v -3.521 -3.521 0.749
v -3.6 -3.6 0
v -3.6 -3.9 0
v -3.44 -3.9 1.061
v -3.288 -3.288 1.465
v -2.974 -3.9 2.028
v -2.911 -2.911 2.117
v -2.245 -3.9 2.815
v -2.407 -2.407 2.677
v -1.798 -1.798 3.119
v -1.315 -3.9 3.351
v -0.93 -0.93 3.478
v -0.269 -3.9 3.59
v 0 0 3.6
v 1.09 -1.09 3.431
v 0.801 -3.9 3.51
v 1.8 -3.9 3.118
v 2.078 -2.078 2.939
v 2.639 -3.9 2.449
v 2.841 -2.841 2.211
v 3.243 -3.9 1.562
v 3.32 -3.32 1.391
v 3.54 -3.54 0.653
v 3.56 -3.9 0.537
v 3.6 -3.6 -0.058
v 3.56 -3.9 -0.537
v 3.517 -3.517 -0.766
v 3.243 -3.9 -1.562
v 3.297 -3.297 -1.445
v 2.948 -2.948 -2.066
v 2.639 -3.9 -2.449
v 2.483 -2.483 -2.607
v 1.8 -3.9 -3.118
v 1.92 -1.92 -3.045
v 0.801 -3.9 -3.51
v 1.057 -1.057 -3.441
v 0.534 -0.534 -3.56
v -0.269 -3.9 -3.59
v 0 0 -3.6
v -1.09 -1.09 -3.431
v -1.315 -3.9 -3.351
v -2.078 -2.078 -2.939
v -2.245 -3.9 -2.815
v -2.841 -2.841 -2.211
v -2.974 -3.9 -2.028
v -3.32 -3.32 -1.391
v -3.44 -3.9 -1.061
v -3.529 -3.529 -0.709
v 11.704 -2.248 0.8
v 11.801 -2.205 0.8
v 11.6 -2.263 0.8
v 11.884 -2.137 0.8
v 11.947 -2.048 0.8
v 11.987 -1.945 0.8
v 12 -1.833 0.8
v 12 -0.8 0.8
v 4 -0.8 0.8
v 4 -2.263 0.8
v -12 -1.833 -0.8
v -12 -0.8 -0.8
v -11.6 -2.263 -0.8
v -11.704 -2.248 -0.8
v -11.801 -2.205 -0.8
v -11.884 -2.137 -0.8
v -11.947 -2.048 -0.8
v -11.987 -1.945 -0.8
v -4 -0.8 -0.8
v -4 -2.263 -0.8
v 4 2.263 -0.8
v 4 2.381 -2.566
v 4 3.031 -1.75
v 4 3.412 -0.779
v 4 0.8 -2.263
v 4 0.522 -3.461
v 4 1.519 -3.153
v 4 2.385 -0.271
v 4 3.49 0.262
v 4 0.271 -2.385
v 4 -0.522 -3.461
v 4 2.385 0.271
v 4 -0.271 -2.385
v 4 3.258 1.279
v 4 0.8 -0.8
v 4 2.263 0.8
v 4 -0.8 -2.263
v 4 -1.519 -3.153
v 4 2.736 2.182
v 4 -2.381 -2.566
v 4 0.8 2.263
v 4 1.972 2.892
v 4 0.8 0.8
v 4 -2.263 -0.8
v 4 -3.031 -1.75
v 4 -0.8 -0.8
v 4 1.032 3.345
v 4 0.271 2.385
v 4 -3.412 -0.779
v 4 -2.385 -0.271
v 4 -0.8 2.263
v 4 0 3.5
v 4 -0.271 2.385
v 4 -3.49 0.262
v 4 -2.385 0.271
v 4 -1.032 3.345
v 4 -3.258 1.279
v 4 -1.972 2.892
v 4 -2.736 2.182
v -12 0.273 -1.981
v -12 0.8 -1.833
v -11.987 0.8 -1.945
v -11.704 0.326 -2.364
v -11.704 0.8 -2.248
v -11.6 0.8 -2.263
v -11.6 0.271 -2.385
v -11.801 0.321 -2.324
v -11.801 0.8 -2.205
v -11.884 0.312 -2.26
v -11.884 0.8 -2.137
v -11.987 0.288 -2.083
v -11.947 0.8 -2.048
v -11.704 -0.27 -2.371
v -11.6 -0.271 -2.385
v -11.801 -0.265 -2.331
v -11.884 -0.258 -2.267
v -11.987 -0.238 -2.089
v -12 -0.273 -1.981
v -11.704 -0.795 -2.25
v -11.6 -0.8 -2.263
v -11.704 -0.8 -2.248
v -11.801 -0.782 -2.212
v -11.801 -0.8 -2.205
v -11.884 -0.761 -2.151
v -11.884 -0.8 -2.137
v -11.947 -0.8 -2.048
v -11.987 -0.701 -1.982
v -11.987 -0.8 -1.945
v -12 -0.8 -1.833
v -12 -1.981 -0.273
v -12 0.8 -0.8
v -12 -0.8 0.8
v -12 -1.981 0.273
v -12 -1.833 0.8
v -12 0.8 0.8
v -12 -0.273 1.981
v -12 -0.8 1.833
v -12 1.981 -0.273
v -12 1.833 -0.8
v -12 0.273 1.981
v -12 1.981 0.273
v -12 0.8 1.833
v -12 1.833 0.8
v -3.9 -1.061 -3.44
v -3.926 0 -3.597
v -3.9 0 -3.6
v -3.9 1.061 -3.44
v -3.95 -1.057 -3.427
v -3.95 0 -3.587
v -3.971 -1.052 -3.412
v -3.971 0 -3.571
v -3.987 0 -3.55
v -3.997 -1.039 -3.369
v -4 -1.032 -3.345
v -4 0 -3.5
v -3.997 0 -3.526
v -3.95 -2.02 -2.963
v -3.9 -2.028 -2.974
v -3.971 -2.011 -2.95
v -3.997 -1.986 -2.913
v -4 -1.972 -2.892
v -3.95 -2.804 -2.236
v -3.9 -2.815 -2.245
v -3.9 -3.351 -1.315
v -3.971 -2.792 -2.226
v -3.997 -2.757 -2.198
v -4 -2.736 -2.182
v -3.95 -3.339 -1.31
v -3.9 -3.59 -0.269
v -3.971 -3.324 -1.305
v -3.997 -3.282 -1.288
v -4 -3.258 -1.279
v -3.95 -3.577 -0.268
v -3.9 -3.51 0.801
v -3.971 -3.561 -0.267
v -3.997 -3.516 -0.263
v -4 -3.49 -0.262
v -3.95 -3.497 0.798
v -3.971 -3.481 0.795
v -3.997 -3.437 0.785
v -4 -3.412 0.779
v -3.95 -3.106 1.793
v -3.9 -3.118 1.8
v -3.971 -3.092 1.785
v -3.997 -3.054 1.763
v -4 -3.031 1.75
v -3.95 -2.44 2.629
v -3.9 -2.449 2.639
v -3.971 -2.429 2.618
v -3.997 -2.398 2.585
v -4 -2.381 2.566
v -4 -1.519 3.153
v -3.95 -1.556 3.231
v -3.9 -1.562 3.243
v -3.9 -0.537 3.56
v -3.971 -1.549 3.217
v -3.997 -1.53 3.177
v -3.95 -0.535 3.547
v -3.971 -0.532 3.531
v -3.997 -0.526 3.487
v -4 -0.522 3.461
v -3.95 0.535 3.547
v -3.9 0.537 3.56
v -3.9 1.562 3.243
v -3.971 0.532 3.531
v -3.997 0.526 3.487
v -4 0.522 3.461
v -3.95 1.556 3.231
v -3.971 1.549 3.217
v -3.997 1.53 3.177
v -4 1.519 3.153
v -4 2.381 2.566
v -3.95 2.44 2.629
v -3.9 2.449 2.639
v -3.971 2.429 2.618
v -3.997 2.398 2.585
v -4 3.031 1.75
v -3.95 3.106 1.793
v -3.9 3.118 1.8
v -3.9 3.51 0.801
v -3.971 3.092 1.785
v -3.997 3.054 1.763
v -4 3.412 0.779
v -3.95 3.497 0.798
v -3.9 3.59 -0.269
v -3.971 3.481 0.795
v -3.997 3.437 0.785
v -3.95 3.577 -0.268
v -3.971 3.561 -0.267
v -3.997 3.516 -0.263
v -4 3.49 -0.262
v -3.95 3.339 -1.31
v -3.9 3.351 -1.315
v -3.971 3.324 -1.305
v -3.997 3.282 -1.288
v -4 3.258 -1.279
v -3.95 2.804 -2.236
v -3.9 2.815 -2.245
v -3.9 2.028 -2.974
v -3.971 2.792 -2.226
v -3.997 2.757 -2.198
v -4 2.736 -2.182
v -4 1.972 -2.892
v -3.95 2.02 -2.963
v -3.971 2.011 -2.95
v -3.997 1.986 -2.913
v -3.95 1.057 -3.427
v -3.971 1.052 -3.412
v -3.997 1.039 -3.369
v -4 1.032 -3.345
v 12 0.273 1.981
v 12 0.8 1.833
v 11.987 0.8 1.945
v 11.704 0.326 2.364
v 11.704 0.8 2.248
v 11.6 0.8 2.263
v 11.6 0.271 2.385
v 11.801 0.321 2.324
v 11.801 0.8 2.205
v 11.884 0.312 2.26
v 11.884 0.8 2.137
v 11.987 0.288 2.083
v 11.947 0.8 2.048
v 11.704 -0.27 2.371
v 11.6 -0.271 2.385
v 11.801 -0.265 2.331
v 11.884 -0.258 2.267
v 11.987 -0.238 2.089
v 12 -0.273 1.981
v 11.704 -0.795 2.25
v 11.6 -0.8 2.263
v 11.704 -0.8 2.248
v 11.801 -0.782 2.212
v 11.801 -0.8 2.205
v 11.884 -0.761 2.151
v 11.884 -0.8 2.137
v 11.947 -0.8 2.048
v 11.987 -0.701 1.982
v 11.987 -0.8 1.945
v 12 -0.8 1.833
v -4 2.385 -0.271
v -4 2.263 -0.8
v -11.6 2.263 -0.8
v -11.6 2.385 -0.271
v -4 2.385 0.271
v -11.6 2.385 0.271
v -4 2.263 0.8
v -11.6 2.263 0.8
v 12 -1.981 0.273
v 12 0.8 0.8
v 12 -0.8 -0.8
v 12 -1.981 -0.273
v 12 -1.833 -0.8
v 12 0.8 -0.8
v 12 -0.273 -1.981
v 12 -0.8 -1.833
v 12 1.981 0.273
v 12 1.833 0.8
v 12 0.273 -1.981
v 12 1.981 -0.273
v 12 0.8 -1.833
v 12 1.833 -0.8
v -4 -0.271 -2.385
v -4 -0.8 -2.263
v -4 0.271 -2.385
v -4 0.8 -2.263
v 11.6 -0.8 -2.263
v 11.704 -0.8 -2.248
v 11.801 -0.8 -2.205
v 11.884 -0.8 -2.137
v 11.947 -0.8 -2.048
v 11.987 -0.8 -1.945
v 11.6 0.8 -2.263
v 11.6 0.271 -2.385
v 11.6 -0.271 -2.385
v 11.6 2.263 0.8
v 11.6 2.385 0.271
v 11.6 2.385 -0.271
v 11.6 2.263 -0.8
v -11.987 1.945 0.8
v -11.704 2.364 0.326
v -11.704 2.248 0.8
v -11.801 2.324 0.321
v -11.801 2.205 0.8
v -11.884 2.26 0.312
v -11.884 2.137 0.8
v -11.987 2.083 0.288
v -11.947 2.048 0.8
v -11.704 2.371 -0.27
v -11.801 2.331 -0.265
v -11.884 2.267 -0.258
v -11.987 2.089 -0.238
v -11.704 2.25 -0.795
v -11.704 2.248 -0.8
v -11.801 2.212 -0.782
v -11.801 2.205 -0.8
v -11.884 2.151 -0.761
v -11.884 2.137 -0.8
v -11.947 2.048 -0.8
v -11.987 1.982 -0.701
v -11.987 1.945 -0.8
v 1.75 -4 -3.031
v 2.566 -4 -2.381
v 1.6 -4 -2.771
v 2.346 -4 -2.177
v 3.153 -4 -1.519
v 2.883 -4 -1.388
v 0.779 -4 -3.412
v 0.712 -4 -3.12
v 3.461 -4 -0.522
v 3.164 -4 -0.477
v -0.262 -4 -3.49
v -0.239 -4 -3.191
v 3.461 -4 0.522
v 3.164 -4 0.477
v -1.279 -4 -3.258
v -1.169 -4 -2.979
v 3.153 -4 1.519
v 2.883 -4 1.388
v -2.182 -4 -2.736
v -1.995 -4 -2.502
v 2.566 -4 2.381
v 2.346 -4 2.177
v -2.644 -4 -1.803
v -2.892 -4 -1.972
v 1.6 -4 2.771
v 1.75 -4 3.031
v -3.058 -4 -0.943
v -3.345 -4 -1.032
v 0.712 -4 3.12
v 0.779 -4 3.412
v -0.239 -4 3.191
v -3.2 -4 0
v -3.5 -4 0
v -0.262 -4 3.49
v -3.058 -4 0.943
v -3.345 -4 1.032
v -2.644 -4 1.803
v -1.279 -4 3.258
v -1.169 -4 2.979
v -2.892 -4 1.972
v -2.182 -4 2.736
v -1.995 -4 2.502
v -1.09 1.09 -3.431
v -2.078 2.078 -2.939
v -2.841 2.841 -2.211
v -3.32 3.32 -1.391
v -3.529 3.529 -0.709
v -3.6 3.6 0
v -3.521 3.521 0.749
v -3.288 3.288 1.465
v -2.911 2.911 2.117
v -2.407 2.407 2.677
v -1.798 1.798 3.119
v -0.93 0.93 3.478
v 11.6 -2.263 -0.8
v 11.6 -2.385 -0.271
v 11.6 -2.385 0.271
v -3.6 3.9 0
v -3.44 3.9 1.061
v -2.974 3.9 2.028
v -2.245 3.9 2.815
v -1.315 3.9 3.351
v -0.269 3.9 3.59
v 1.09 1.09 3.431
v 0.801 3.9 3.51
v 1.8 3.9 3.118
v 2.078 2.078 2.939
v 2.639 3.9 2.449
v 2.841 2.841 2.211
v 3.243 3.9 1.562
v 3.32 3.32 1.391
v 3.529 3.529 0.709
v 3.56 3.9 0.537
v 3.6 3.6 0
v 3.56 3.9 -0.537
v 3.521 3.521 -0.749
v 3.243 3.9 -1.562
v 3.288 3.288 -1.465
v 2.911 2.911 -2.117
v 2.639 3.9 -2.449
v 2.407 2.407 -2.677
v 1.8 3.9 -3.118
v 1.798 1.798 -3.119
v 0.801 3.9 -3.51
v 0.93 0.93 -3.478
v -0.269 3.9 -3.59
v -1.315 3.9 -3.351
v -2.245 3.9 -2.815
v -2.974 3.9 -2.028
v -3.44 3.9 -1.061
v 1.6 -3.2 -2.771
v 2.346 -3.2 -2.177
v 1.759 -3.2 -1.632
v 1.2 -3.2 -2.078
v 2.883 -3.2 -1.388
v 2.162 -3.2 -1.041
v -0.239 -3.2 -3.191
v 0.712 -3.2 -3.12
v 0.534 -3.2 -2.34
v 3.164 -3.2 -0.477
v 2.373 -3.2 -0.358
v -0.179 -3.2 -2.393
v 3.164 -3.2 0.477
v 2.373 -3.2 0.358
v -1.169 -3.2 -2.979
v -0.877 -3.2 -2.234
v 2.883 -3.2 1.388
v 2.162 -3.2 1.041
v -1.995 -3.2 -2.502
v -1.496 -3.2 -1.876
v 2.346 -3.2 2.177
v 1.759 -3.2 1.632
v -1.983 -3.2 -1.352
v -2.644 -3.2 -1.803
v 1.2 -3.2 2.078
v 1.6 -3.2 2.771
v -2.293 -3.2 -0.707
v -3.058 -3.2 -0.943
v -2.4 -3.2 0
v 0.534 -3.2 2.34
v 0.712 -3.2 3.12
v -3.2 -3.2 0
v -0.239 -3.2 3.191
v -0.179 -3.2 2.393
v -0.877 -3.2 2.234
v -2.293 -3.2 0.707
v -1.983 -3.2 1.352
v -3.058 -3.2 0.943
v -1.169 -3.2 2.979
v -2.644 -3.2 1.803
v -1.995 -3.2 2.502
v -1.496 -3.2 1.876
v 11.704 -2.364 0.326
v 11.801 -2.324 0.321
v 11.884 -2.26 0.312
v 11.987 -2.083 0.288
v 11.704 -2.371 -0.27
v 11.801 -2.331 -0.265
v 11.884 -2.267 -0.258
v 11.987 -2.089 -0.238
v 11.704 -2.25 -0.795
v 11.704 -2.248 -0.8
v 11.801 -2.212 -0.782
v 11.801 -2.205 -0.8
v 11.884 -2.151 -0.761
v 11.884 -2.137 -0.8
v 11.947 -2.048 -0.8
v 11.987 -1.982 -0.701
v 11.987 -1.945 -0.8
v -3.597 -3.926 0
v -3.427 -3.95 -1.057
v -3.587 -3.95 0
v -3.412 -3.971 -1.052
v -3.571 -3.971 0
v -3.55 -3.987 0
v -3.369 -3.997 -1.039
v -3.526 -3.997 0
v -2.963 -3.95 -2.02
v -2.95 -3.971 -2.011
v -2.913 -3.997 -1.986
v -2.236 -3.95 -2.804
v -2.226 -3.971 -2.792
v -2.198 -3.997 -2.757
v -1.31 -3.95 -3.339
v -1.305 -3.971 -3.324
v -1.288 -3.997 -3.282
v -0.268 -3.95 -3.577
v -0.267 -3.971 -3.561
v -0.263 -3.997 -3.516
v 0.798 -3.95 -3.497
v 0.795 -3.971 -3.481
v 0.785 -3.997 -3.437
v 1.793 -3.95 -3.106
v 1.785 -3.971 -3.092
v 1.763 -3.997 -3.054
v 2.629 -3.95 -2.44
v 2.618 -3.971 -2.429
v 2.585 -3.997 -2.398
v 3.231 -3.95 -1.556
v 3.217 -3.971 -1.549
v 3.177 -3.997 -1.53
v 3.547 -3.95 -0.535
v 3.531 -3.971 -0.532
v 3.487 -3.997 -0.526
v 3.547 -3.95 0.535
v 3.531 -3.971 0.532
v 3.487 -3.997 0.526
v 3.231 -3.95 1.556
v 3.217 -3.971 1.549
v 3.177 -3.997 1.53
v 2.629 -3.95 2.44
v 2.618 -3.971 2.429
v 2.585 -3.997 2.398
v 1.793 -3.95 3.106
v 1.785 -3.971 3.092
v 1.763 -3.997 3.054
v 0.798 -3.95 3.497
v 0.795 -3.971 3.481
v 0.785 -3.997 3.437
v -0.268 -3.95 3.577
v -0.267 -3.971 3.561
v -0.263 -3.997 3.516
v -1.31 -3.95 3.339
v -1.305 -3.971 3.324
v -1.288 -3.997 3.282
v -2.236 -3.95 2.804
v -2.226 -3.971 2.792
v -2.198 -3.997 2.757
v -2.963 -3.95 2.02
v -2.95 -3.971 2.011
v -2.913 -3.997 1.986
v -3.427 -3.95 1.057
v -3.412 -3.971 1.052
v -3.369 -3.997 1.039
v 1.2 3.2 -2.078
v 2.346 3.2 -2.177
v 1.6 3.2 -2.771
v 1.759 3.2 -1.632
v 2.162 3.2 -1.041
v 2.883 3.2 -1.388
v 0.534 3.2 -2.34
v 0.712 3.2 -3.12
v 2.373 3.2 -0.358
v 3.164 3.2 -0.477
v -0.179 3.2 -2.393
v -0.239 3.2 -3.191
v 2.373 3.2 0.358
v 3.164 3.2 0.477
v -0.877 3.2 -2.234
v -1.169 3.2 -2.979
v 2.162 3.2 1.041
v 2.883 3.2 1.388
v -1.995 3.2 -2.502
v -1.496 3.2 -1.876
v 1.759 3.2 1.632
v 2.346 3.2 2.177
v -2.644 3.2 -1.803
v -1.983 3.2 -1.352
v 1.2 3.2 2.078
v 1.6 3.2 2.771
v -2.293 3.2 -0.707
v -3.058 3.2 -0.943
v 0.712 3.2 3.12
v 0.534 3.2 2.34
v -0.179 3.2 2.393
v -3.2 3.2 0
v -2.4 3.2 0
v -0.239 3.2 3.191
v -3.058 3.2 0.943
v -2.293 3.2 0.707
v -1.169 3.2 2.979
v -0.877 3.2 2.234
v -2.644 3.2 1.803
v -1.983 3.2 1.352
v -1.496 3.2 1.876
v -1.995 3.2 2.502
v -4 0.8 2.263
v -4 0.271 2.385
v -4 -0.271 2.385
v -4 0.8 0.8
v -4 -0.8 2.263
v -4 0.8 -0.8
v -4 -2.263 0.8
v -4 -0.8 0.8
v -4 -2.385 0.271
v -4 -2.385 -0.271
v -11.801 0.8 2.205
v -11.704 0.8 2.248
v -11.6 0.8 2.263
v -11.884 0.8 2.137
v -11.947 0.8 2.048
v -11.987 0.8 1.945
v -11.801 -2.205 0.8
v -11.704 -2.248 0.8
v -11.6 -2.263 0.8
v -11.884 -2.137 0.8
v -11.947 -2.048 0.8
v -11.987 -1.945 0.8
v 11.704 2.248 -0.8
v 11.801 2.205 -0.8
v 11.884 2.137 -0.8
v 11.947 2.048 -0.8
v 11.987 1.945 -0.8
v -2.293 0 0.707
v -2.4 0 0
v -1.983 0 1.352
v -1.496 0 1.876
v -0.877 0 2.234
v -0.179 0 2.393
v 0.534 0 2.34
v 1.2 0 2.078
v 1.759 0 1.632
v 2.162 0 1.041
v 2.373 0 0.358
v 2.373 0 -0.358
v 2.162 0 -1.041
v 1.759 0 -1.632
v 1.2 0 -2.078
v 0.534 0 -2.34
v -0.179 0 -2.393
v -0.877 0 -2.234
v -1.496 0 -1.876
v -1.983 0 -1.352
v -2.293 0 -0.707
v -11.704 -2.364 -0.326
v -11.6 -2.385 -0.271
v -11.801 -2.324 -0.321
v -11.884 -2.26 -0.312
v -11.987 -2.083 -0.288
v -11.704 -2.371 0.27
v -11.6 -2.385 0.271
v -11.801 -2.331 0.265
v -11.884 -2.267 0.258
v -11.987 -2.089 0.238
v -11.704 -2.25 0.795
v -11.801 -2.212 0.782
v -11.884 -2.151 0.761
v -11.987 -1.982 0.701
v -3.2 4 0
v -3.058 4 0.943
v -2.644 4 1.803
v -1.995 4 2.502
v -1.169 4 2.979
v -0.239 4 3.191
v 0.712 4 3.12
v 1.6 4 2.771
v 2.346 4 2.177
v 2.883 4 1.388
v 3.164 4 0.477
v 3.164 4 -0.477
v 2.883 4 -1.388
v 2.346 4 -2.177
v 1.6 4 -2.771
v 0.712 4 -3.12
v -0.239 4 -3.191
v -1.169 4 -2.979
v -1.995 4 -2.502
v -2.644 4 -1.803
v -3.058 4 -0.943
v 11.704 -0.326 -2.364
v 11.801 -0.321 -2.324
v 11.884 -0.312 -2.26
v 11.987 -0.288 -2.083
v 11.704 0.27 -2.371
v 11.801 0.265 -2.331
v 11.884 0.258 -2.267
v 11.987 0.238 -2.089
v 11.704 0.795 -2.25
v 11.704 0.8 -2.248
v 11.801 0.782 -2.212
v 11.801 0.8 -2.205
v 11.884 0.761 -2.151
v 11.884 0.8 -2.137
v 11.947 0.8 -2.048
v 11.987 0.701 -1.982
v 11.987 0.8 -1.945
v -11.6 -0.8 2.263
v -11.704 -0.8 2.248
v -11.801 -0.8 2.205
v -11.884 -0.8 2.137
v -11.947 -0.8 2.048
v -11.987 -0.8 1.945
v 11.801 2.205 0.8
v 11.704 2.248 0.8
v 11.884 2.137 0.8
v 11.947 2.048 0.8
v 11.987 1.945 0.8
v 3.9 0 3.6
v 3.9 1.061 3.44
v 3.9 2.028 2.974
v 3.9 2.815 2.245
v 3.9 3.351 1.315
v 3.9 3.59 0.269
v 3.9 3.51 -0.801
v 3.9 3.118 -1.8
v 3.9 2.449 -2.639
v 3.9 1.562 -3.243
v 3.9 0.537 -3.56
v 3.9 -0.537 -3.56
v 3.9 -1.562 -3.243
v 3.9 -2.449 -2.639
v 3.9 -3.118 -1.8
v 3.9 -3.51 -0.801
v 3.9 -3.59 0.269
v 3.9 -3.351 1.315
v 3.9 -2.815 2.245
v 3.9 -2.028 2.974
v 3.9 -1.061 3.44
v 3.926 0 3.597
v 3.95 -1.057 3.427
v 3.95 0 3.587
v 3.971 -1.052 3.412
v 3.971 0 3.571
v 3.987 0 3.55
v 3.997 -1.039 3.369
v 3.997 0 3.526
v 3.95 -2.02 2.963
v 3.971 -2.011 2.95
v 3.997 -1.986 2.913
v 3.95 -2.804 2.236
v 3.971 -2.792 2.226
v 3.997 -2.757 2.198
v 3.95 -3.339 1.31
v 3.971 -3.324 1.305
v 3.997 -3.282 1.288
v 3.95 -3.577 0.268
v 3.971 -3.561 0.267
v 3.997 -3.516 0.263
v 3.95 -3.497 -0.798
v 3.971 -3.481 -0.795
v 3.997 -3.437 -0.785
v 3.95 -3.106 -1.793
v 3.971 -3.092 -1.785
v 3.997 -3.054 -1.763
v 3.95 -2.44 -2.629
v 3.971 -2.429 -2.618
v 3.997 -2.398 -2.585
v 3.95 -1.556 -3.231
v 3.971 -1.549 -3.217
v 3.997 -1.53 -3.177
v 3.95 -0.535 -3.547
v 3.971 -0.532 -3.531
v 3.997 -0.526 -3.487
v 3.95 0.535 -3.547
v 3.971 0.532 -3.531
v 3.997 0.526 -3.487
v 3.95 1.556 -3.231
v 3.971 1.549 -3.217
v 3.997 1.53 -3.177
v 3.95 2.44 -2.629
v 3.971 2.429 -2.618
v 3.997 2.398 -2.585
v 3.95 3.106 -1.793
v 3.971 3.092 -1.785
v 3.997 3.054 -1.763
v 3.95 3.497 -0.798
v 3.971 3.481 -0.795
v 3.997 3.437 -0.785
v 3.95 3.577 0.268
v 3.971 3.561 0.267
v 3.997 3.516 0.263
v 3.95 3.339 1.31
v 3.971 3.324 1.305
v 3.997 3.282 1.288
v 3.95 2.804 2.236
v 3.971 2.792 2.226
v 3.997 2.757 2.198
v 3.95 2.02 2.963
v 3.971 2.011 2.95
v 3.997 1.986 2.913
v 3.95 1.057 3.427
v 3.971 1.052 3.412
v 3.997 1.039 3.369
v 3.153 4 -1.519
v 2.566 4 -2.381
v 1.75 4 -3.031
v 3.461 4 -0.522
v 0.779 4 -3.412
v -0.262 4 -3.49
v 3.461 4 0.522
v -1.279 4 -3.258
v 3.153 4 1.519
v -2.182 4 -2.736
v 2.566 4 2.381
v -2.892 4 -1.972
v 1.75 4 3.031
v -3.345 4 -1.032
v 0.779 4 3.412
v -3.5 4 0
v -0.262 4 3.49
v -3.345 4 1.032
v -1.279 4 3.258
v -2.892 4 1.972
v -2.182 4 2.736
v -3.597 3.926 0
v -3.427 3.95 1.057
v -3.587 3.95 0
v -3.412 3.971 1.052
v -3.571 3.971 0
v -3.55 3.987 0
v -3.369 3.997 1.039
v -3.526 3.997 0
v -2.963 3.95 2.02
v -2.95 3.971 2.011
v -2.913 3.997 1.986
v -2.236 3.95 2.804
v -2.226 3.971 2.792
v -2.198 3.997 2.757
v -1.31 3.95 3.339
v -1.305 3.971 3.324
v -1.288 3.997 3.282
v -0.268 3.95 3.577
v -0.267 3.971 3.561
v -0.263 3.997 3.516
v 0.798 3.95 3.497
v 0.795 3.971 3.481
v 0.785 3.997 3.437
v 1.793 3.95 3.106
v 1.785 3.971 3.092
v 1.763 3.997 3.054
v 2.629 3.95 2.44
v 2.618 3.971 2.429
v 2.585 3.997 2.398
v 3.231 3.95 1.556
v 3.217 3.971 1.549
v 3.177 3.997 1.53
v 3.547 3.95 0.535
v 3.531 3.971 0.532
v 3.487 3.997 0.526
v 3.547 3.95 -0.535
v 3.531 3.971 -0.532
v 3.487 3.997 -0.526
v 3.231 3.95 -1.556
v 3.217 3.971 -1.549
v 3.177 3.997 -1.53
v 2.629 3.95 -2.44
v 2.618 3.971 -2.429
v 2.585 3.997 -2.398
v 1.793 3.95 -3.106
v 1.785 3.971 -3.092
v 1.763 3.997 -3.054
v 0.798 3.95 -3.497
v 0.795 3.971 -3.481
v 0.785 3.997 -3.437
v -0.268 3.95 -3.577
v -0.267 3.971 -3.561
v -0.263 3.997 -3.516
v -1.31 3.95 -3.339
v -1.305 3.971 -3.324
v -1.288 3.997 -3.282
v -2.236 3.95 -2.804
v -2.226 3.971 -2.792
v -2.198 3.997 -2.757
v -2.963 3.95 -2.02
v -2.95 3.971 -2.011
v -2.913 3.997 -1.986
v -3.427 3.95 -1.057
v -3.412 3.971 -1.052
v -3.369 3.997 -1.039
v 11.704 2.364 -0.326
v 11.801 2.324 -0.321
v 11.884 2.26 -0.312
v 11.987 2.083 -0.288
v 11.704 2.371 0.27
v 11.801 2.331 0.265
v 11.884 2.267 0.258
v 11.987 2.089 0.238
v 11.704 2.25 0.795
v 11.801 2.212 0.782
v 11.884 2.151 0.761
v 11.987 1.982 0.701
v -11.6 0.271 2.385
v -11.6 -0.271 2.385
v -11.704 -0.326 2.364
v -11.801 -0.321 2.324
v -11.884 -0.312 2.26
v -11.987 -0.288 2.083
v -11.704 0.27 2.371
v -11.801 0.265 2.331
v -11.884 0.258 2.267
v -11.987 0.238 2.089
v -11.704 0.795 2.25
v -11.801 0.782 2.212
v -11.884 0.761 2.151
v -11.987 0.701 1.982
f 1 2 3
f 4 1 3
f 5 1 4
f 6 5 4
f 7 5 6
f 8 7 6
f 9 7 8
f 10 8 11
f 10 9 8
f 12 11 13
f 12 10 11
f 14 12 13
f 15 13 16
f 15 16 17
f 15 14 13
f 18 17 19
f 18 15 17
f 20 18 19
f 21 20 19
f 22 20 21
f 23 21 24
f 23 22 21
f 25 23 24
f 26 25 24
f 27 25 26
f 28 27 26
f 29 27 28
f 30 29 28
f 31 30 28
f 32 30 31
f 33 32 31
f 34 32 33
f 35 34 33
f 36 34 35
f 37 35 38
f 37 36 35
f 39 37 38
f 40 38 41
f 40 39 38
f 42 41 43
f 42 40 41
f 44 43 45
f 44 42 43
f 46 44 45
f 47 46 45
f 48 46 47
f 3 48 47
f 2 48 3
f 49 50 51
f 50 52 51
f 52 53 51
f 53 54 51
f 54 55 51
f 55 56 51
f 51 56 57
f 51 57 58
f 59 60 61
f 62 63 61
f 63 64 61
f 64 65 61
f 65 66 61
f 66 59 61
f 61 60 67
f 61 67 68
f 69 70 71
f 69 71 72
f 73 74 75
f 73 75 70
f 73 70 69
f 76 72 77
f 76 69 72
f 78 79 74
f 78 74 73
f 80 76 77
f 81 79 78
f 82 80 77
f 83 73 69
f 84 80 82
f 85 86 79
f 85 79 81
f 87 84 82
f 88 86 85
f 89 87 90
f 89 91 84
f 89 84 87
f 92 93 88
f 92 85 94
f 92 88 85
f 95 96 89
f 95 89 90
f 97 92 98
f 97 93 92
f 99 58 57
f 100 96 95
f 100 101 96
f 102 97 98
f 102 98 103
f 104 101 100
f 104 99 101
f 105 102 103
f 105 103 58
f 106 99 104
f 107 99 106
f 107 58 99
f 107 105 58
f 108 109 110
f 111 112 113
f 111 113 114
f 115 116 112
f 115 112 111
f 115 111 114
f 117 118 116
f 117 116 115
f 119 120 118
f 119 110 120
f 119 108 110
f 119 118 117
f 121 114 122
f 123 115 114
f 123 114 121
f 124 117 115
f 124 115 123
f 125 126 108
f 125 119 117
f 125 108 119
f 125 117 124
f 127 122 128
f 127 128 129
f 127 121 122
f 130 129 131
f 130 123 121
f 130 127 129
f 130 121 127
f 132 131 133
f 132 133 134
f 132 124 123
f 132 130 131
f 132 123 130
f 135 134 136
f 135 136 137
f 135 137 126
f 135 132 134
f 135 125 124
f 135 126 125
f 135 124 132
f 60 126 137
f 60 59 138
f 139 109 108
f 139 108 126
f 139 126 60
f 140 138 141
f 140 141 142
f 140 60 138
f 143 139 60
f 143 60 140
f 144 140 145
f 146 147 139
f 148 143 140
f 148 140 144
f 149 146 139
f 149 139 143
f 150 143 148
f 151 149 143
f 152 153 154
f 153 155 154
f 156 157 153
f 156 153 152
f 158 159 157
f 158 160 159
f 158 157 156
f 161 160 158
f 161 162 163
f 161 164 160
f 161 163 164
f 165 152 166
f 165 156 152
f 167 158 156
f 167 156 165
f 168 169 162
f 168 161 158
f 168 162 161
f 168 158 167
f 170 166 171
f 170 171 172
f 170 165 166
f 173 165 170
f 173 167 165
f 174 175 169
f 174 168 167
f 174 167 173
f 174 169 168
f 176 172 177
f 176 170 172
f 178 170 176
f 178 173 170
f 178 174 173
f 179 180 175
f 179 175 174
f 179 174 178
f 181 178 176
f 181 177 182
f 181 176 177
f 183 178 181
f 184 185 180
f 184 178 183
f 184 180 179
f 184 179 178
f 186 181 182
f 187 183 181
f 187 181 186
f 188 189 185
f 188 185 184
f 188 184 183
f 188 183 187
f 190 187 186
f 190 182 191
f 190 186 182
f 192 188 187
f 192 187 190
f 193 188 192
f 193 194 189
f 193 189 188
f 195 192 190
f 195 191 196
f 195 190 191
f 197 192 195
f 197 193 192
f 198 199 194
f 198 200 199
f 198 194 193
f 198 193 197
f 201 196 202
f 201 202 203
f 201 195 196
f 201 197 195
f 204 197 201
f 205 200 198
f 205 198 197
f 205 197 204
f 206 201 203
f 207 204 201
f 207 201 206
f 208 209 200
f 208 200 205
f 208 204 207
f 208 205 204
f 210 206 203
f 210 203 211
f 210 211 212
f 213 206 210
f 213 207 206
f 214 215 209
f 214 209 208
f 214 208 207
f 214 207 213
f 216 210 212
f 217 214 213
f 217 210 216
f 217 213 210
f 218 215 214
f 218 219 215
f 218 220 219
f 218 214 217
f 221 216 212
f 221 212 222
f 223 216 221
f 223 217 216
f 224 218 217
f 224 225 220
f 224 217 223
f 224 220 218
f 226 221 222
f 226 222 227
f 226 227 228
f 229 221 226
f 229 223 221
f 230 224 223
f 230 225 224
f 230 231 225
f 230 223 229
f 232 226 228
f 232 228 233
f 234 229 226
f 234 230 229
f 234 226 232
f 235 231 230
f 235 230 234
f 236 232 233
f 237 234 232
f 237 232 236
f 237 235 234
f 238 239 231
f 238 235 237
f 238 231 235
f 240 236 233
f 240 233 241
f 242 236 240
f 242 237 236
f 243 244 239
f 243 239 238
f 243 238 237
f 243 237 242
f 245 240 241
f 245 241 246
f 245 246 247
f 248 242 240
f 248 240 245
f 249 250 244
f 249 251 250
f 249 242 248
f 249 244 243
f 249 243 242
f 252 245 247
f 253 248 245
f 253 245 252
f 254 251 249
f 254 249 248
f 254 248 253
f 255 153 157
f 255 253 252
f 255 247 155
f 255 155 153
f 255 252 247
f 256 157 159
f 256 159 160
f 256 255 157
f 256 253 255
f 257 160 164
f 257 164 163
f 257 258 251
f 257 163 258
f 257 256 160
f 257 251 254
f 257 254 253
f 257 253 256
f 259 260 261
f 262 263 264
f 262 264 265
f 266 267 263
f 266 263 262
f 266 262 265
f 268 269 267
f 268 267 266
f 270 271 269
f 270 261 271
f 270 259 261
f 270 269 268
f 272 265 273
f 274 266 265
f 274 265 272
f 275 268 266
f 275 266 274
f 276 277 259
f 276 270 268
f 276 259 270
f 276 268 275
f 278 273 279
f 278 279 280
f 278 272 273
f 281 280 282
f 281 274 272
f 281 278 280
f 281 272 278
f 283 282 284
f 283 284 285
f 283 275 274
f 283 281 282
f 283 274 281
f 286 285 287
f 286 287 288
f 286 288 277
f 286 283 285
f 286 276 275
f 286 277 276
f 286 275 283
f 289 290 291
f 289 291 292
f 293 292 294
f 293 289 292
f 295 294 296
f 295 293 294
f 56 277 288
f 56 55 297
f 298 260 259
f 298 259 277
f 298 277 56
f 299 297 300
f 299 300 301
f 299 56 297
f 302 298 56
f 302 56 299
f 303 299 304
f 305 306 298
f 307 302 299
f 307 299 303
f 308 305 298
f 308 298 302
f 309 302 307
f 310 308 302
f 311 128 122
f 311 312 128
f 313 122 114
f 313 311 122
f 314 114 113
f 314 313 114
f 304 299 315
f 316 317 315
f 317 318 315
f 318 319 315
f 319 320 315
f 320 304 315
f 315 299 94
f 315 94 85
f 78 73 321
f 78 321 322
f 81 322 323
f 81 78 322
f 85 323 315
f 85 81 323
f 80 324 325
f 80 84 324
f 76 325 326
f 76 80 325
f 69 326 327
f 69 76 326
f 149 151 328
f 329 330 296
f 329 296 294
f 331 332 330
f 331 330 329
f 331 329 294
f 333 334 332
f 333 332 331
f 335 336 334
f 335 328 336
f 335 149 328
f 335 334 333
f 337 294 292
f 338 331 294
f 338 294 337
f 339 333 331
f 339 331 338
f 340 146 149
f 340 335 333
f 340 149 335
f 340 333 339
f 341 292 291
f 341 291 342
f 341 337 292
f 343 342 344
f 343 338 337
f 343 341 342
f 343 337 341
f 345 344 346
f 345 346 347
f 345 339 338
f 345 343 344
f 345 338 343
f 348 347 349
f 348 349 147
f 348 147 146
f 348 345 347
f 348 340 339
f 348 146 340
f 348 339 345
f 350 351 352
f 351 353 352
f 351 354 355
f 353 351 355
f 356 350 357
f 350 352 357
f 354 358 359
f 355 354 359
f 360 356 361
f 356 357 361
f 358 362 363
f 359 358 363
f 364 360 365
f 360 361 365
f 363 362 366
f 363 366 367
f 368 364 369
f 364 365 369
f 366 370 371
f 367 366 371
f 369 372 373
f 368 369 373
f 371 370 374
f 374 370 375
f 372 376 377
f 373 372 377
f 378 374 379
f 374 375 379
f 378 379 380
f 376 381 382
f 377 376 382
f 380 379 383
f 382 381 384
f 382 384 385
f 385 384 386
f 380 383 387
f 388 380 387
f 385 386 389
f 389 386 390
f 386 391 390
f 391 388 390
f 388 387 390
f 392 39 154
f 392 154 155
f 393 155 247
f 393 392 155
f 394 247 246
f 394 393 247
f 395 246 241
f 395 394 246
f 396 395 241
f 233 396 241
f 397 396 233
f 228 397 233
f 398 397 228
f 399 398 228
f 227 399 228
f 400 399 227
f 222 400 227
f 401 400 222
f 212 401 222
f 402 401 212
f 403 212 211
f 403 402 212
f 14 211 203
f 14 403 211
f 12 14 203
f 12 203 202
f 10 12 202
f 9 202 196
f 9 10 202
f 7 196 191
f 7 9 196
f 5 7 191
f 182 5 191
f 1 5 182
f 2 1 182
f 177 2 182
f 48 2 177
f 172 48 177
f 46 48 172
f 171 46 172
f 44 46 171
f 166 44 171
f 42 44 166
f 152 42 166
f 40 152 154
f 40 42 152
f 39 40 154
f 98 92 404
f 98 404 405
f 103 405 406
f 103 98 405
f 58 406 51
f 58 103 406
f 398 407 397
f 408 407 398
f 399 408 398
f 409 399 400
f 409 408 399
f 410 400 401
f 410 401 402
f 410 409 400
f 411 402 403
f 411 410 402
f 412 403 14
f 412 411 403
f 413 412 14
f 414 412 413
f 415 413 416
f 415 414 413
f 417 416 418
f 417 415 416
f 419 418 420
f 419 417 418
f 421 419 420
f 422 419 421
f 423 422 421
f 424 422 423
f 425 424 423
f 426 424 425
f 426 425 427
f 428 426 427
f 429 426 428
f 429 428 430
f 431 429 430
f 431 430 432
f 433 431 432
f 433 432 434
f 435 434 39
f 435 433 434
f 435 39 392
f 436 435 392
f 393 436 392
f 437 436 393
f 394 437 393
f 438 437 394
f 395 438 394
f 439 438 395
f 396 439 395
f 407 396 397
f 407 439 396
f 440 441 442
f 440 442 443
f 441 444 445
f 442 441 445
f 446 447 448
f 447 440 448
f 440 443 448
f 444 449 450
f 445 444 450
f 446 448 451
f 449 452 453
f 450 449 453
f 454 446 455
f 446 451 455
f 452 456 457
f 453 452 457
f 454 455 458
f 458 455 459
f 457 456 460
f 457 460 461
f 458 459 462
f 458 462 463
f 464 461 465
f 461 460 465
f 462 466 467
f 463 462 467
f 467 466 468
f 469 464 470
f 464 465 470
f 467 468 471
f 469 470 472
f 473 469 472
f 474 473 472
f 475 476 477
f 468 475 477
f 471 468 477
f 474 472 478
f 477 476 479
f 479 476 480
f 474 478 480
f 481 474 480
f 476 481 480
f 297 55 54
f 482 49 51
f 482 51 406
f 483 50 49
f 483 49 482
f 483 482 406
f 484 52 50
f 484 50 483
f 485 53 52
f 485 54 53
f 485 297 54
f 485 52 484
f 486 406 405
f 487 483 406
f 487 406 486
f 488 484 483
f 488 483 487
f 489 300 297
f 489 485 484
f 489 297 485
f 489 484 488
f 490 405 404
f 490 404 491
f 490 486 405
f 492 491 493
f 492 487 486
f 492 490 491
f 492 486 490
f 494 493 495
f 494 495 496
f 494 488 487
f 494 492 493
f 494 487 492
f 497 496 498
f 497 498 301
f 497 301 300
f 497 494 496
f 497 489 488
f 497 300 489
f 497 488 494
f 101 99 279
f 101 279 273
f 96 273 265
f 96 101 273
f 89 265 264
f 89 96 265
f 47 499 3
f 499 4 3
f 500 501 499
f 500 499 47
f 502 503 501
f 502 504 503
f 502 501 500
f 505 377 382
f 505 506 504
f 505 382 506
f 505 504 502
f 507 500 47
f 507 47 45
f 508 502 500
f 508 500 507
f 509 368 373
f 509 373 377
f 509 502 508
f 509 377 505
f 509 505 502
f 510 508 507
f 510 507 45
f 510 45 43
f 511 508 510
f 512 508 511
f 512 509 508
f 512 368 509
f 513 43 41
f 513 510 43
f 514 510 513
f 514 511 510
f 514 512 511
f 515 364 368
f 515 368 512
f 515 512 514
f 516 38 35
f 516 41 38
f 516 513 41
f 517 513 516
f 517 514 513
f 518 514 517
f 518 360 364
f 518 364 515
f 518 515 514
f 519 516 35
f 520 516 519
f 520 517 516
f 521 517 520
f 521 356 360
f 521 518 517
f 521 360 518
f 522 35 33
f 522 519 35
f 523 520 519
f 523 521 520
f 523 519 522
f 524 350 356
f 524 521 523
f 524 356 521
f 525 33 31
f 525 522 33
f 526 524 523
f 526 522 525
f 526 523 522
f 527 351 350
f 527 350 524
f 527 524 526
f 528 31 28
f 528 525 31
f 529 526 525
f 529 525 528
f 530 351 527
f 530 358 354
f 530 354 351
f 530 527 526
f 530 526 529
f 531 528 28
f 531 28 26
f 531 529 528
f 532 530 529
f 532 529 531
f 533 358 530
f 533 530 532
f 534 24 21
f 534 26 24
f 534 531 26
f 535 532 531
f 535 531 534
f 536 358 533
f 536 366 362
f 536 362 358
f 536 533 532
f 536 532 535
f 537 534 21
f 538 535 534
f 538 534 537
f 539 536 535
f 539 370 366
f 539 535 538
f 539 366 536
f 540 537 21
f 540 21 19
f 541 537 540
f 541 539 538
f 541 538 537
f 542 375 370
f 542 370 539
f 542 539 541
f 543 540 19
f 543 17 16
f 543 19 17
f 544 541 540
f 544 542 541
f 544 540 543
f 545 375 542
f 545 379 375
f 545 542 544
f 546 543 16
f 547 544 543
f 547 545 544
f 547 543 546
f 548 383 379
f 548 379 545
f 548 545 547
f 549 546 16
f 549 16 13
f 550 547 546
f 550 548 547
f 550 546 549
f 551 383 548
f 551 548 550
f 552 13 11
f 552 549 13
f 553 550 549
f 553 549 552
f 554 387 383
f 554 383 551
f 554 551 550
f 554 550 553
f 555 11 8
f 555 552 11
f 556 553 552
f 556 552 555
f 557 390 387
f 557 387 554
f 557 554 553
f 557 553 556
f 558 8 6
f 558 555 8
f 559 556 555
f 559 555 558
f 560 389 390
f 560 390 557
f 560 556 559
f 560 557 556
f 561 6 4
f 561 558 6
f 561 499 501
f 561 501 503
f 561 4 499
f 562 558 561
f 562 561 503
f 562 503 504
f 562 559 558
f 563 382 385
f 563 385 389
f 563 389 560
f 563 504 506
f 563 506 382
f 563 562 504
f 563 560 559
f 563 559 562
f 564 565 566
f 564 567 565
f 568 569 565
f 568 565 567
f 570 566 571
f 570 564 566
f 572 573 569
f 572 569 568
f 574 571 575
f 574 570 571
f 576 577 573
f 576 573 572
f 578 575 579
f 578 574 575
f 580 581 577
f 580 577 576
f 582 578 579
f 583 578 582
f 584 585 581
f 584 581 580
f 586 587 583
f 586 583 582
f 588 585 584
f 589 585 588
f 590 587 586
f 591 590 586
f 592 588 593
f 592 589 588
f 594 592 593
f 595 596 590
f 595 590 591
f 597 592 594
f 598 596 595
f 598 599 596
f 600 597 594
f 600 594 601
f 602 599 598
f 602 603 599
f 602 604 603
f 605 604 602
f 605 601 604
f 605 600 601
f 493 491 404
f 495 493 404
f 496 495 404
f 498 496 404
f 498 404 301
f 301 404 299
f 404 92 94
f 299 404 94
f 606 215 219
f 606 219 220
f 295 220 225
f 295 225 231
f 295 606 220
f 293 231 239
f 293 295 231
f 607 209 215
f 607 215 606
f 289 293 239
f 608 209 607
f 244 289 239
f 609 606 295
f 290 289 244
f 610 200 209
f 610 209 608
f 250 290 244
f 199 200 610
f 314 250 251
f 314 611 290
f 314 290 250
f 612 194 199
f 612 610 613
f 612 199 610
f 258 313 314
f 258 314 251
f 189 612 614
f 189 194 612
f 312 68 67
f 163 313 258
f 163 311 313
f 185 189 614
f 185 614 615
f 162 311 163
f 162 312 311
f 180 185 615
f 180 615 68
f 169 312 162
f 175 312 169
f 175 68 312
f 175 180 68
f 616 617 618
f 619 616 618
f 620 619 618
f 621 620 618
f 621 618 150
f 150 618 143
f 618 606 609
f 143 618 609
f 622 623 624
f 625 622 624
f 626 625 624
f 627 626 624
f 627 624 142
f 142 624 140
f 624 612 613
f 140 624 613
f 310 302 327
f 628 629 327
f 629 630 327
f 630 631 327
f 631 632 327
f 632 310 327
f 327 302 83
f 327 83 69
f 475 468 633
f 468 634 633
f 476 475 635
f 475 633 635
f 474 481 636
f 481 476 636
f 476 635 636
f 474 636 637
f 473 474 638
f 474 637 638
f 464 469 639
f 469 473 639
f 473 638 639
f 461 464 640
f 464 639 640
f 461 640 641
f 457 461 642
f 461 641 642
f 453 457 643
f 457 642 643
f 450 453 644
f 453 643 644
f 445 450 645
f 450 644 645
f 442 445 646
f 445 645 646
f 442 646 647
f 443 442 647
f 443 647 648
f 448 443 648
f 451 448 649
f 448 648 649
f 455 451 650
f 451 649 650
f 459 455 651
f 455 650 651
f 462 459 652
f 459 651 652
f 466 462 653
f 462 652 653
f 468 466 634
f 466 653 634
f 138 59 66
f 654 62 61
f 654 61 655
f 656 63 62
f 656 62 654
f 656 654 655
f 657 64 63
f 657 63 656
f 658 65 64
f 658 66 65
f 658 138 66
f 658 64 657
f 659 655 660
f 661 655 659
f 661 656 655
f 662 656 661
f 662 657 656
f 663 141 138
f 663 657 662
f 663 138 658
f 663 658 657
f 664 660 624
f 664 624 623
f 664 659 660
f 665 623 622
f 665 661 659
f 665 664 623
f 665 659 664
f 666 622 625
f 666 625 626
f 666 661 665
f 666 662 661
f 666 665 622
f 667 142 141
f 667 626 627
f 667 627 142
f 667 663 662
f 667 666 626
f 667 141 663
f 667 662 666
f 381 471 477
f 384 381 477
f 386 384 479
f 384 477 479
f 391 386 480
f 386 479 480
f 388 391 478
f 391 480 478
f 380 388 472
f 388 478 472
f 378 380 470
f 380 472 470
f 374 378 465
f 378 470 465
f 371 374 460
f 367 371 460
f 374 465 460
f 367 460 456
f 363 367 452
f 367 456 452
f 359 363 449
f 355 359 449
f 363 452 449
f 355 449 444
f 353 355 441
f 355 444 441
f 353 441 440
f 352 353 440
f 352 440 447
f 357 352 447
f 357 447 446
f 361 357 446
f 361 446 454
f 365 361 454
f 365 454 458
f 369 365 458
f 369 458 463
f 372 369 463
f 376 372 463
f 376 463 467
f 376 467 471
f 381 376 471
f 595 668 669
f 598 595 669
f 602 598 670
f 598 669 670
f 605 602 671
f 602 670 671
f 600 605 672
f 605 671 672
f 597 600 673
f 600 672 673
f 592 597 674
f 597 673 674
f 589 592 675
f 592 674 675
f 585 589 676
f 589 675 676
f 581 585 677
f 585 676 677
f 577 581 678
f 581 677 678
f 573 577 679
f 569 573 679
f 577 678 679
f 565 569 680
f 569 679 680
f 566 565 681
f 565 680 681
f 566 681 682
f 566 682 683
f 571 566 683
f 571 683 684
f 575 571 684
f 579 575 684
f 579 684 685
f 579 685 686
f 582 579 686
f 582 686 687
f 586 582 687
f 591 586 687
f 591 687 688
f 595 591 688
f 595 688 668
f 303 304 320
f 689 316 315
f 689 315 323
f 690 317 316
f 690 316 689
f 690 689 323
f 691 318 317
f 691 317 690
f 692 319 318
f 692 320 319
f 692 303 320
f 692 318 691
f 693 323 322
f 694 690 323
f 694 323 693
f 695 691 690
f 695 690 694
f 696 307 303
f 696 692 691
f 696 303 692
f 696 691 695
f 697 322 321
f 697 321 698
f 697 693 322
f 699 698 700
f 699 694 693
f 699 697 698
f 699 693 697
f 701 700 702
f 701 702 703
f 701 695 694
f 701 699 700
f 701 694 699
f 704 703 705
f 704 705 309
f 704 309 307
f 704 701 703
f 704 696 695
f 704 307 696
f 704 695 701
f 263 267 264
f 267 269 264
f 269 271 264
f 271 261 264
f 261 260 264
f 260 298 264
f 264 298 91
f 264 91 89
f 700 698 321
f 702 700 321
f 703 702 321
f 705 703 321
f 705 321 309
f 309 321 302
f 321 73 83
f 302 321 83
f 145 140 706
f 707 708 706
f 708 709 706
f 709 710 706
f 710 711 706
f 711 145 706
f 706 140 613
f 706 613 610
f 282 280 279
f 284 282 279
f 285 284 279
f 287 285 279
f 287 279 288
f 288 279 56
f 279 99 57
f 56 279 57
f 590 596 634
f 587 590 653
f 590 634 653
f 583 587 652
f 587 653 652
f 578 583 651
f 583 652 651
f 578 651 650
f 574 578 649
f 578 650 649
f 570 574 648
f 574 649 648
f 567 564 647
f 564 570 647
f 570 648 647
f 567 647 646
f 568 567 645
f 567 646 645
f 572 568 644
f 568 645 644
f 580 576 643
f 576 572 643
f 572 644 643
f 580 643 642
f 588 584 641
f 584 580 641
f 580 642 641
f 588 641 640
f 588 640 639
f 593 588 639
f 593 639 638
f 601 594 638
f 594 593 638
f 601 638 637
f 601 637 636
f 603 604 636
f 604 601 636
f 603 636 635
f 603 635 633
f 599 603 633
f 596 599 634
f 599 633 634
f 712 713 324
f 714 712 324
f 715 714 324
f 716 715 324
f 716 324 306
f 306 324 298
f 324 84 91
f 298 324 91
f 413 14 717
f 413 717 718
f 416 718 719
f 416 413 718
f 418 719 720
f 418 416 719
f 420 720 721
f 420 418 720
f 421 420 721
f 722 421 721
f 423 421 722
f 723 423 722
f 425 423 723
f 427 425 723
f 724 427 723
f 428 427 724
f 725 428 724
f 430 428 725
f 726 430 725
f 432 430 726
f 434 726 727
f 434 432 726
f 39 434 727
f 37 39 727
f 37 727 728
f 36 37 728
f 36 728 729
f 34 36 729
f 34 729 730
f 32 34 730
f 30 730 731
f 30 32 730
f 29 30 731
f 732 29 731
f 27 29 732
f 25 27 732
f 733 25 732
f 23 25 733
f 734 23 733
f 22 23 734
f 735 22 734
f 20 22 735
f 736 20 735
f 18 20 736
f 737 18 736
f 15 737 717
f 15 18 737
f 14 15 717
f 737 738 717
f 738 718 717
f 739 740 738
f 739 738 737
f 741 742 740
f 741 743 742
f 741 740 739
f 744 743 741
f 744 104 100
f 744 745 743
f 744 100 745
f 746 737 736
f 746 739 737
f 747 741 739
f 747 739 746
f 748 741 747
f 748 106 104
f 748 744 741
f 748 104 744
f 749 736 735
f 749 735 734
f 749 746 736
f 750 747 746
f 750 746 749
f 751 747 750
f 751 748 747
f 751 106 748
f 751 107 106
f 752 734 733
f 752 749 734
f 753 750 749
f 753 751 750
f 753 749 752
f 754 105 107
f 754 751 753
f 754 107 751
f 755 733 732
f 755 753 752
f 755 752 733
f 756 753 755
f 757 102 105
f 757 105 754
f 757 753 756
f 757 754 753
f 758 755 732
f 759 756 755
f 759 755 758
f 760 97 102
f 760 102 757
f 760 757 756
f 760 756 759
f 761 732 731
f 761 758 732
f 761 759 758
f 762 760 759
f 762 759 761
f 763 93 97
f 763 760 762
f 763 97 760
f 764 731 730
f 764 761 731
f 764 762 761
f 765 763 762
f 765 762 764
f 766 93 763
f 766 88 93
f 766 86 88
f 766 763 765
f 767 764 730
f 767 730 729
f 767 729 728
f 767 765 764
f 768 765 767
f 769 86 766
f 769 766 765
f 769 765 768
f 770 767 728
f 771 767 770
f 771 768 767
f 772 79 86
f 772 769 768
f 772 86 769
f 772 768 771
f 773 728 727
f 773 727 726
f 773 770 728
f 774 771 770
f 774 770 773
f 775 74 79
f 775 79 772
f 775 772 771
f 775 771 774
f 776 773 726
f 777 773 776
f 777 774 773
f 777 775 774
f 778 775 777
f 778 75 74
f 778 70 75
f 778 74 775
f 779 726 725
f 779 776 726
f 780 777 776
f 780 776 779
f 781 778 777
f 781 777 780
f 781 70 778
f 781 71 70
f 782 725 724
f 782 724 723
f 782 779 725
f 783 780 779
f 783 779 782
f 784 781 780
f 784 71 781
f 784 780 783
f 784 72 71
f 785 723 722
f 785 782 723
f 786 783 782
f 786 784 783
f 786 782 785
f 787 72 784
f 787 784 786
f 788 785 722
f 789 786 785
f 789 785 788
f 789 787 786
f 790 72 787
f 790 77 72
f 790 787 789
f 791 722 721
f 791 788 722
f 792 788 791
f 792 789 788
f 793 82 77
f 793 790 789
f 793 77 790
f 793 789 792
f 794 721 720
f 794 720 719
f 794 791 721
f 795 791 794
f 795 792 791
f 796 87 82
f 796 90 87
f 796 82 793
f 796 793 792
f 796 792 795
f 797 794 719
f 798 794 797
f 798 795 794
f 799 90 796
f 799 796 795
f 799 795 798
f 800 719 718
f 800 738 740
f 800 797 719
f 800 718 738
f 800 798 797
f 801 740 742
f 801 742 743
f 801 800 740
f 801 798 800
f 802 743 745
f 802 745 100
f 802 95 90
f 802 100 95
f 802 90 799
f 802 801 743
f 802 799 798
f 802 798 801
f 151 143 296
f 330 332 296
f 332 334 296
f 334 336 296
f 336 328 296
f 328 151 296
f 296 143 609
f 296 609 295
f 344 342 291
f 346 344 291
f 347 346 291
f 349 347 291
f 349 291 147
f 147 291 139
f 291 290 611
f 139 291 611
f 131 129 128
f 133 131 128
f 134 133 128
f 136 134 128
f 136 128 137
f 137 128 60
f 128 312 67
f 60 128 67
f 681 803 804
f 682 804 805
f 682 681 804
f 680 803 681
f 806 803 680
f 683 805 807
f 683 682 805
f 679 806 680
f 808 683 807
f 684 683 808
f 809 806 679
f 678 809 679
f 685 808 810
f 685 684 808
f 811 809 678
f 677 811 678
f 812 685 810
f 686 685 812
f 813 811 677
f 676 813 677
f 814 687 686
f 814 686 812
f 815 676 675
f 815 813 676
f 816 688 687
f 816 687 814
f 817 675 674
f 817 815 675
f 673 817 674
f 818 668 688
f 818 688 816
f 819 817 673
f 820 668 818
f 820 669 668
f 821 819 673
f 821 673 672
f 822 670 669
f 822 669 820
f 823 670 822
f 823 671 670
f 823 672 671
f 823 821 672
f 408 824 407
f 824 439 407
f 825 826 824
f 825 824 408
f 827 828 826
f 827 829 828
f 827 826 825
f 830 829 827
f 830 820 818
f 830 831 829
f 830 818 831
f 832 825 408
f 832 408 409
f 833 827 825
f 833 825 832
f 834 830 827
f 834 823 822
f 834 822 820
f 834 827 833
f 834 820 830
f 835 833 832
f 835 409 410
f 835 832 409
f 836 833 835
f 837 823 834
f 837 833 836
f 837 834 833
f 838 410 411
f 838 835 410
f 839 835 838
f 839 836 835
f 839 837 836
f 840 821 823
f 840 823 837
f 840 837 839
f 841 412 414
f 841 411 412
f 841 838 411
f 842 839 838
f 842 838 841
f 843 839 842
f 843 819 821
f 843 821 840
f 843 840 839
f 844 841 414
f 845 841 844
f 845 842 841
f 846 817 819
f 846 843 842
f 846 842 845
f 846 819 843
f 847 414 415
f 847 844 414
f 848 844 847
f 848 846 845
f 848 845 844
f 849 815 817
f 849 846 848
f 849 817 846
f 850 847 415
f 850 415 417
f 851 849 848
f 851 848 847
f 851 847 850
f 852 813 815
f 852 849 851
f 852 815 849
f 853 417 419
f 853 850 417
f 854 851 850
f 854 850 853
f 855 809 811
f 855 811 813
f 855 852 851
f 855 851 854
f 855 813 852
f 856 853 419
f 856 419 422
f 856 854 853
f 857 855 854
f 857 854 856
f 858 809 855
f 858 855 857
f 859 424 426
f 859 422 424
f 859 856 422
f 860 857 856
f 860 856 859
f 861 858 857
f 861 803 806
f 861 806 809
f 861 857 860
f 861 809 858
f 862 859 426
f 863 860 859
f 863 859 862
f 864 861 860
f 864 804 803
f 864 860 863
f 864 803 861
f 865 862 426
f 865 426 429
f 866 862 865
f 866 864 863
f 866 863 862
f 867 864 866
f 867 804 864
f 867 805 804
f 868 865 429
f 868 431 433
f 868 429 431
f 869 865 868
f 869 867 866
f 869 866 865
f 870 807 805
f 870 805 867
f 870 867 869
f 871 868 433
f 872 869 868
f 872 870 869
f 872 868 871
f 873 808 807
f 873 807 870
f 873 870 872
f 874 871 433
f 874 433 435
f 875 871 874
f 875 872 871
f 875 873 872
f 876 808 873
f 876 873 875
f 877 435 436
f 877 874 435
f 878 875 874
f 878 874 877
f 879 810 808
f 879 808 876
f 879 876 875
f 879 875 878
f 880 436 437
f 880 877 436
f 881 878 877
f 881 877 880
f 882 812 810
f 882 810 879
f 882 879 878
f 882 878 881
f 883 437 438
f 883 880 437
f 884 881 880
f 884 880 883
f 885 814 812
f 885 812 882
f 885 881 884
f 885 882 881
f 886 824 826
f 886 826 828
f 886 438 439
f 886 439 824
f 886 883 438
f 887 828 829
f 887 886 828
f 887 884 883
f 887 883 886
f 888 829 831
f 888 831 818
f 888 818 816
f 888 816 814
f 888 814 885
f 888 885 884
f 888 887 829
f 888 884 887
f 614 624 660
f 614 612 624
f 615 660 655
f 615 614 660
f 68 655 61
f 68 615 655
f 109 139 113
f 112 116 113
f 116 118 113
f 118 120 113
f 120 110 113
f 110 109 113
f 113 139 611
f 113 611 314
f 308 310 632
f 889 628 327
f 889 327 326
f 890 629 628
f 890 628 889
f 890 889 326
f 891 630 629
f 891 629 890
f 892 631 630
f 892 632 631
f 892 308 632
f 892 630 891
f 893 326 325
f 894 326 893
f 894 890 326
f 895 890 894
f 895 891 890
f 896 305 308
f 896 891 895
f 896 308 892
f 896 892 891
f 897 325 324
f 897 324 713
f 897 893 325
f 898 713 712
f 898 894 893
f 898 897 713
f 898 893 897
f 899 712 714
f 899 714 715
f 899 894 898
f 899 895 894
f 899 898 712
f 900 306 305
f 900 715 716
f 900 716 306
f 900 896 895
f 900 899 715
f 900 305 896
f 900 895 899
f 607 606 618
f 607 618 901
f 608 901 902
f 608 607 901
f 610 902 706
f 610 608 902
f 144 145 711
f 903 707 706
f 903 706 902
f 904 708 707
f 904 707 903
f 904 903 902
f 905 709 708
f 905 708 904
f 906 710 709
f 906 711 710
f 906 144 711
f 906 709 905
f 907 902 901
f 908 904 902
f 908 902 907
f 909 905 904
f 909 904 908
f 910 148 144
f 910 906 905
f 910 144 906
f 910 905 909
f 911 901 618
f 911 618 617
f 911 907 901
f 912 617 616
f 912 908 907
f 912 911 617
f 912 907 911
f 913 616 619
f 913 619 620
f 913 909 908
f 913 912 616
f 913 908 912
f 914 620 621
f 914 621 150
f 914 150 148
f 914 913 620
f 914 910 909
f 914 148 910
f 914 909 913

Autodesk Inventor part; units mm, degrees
ref_plane "YZ Plane" through (0, 0, 0) normal (1, 0, 0) x (0, 1, 0)
ref_plane "XZ Plane" through (0, 0, 0) normal (0, 1, 0) x (-1, 0, 0)
ref_plane "XY Plane" through (0, 0, 0) normal (0, 0, 1) x (1, 0, 0)
sketch "Sketch2" plane through (0, 0, 0) normal (0, 1, 0) x (-1, 0, 0)
  circle A0 centre (0, 0) radius 3.6
  circle A1 centre (0, 0) radius 3.2
  circle A2 centre (0, 0) radius 2.4
  line L0 (0, 0) -> (-4, 0)
  line L1 (-4, 0) -> (-4, 3.6)
  line L2 (-4, 3.6) -> (0, 3.6)
  line L3 (0, 3.6) -> (0, 0)
  dimension "d0" = 4.8
  dimension "d1" = 6.4
  dimension "d2" = 7.2
  dimension "d3" = 4
  dimension "d4" = 7.2
extrude "Extrusion1" add sketch "Sketch2" along normal mid plane 8 contours A0 L0 A1 L3 | L3 A1 L0 A0 | L3 A2 L0 A1 | A1 L0 A2 L3 | L3 L0 A2 | A2 L0 L3
revolve "Revolution1" add sketch "Sketch2" angle 360 about axis through (0, 0, 0) along (1, 0, 0) picked at (-3.4098, 0.5044) picked at (-2.9066, 0.2374) picked at (-0.178, 1.5799) contours L3 A1 L0 A0 | A0 L0 L1 L2 | L3 A2 L0 A1 | L3 L0 A2
sketch "Sketch3" plane through (4, 0, 0) normal (1, 0, 0) x (0, 0, -1)
  circle A0 centre (0, 0) radius 3.6 projected
  circle A1 centre (0, 0) radius 2.4 construction
  line L0 (-0.8, 2.2627) -> (-0.8, 0.8)
  line L1 (-0.8, 0.8) -> (-2.2627, 0.8)
  line L2 (-2.2627, -0.8) -> (-0.8, -0.8)
  line L3 (-0.8, -0.8) -> (-0.8, -2.2627)
  line L4 (0.8, -2.2627) -> (0.8, -0.8)
  line L5 (0.8, -0.8) -> (2.2627, -0.8)
  line L6 (2.2627, 0.8) -> (0.8, 0.8)
  line L7 (0.8, 0.8) -> (0.8, 2.2627)
  arc A2 (0.8, 2.2627) -> (-0.8, 2.2627) centre (0, 0) ccw
  arc A3 (-2.2627, 0.8) -> (-2.2627, -0.8) centre (0, 0) ccw
  arc A4 (-0.8, -2.2627) -> (0.8, -2.2627) centre (0, 0) ccw
  arc A5 (2.2627, -0.8) -> (2.2627, 0.8) centre (0, 0) ccw
  dimension "d13" = 4.8
  dimension "d12" = 1.6
extrude "Extrusion4" add sketch "Sketch3" along normal blind 8 contours A2 L7 L6 A5 L5 L4 A4 L3 L2 A3 L1 L0
pattern_circular "Circular Pattern1" count 2 over 360 about axis through (0, 0, 0) along (0, 1, 0) of "Revolution1", "Extrusion4"
extrude "Extrusion2" cut sketch "Sketch2" along normal through all both and the other way through all contours L3 A2 L0 A1 | A1 L0 A2 L3 | L3 L0 A2 | A2 L0 L3
extrude "Extrusion3" add sketch "Sketch2" along normal mid plane 6.4 contours L3 A2 L0 A1 | A1 L0 A2 L3
fillet "Fillet1" radius 0.1 4 edges at (3.6, 4, 0) (3.6, -4, 0) (4, 0, -3.6) (-4, 0, 3.6)
fillet "Fillet1" radius 0.4 8 edges at (12, 0, 2.4) (12, 2.4, 0) (12, 0, -2.4) (12, -2.4, 0) (-12, 0, 2.4) (-12, 2.4, 0) (-12, -2.4, 0) (-12, 0, -2.4)
equation "\"d0\" = tpd"
equation "\"d1\" = tsd"
equation "\"d2\" = tlad"
equation "\"d4\" = d2"
equation "\"d5\" = lu"
equation "\"d13\" = kd"
equation "\"d12\" = axlet"
equation "\"d14\" = lu"
equation "\"d8\" = lu"
equation "\"d10\" = lu - 2 * tsl"
equation "\"d16\" = lf"
equation "\"d17\" = tf"
equation "\"tpd\" = 4.8"
equation "\"tsd\" = 6.4"
equation "\"tlad\" = 7.2"
equation "\"lu\" = 8"
equation "\"kd\" = 4.8"
equation "\"axlet\" = 1.6"
equation "\"tsl\" = 0.8"
equation "\"lf\" = 0.1"
equation "\"tf\" = 0.4"
properties part number "27940-DkBluishGray" material "ABS Plastic"
